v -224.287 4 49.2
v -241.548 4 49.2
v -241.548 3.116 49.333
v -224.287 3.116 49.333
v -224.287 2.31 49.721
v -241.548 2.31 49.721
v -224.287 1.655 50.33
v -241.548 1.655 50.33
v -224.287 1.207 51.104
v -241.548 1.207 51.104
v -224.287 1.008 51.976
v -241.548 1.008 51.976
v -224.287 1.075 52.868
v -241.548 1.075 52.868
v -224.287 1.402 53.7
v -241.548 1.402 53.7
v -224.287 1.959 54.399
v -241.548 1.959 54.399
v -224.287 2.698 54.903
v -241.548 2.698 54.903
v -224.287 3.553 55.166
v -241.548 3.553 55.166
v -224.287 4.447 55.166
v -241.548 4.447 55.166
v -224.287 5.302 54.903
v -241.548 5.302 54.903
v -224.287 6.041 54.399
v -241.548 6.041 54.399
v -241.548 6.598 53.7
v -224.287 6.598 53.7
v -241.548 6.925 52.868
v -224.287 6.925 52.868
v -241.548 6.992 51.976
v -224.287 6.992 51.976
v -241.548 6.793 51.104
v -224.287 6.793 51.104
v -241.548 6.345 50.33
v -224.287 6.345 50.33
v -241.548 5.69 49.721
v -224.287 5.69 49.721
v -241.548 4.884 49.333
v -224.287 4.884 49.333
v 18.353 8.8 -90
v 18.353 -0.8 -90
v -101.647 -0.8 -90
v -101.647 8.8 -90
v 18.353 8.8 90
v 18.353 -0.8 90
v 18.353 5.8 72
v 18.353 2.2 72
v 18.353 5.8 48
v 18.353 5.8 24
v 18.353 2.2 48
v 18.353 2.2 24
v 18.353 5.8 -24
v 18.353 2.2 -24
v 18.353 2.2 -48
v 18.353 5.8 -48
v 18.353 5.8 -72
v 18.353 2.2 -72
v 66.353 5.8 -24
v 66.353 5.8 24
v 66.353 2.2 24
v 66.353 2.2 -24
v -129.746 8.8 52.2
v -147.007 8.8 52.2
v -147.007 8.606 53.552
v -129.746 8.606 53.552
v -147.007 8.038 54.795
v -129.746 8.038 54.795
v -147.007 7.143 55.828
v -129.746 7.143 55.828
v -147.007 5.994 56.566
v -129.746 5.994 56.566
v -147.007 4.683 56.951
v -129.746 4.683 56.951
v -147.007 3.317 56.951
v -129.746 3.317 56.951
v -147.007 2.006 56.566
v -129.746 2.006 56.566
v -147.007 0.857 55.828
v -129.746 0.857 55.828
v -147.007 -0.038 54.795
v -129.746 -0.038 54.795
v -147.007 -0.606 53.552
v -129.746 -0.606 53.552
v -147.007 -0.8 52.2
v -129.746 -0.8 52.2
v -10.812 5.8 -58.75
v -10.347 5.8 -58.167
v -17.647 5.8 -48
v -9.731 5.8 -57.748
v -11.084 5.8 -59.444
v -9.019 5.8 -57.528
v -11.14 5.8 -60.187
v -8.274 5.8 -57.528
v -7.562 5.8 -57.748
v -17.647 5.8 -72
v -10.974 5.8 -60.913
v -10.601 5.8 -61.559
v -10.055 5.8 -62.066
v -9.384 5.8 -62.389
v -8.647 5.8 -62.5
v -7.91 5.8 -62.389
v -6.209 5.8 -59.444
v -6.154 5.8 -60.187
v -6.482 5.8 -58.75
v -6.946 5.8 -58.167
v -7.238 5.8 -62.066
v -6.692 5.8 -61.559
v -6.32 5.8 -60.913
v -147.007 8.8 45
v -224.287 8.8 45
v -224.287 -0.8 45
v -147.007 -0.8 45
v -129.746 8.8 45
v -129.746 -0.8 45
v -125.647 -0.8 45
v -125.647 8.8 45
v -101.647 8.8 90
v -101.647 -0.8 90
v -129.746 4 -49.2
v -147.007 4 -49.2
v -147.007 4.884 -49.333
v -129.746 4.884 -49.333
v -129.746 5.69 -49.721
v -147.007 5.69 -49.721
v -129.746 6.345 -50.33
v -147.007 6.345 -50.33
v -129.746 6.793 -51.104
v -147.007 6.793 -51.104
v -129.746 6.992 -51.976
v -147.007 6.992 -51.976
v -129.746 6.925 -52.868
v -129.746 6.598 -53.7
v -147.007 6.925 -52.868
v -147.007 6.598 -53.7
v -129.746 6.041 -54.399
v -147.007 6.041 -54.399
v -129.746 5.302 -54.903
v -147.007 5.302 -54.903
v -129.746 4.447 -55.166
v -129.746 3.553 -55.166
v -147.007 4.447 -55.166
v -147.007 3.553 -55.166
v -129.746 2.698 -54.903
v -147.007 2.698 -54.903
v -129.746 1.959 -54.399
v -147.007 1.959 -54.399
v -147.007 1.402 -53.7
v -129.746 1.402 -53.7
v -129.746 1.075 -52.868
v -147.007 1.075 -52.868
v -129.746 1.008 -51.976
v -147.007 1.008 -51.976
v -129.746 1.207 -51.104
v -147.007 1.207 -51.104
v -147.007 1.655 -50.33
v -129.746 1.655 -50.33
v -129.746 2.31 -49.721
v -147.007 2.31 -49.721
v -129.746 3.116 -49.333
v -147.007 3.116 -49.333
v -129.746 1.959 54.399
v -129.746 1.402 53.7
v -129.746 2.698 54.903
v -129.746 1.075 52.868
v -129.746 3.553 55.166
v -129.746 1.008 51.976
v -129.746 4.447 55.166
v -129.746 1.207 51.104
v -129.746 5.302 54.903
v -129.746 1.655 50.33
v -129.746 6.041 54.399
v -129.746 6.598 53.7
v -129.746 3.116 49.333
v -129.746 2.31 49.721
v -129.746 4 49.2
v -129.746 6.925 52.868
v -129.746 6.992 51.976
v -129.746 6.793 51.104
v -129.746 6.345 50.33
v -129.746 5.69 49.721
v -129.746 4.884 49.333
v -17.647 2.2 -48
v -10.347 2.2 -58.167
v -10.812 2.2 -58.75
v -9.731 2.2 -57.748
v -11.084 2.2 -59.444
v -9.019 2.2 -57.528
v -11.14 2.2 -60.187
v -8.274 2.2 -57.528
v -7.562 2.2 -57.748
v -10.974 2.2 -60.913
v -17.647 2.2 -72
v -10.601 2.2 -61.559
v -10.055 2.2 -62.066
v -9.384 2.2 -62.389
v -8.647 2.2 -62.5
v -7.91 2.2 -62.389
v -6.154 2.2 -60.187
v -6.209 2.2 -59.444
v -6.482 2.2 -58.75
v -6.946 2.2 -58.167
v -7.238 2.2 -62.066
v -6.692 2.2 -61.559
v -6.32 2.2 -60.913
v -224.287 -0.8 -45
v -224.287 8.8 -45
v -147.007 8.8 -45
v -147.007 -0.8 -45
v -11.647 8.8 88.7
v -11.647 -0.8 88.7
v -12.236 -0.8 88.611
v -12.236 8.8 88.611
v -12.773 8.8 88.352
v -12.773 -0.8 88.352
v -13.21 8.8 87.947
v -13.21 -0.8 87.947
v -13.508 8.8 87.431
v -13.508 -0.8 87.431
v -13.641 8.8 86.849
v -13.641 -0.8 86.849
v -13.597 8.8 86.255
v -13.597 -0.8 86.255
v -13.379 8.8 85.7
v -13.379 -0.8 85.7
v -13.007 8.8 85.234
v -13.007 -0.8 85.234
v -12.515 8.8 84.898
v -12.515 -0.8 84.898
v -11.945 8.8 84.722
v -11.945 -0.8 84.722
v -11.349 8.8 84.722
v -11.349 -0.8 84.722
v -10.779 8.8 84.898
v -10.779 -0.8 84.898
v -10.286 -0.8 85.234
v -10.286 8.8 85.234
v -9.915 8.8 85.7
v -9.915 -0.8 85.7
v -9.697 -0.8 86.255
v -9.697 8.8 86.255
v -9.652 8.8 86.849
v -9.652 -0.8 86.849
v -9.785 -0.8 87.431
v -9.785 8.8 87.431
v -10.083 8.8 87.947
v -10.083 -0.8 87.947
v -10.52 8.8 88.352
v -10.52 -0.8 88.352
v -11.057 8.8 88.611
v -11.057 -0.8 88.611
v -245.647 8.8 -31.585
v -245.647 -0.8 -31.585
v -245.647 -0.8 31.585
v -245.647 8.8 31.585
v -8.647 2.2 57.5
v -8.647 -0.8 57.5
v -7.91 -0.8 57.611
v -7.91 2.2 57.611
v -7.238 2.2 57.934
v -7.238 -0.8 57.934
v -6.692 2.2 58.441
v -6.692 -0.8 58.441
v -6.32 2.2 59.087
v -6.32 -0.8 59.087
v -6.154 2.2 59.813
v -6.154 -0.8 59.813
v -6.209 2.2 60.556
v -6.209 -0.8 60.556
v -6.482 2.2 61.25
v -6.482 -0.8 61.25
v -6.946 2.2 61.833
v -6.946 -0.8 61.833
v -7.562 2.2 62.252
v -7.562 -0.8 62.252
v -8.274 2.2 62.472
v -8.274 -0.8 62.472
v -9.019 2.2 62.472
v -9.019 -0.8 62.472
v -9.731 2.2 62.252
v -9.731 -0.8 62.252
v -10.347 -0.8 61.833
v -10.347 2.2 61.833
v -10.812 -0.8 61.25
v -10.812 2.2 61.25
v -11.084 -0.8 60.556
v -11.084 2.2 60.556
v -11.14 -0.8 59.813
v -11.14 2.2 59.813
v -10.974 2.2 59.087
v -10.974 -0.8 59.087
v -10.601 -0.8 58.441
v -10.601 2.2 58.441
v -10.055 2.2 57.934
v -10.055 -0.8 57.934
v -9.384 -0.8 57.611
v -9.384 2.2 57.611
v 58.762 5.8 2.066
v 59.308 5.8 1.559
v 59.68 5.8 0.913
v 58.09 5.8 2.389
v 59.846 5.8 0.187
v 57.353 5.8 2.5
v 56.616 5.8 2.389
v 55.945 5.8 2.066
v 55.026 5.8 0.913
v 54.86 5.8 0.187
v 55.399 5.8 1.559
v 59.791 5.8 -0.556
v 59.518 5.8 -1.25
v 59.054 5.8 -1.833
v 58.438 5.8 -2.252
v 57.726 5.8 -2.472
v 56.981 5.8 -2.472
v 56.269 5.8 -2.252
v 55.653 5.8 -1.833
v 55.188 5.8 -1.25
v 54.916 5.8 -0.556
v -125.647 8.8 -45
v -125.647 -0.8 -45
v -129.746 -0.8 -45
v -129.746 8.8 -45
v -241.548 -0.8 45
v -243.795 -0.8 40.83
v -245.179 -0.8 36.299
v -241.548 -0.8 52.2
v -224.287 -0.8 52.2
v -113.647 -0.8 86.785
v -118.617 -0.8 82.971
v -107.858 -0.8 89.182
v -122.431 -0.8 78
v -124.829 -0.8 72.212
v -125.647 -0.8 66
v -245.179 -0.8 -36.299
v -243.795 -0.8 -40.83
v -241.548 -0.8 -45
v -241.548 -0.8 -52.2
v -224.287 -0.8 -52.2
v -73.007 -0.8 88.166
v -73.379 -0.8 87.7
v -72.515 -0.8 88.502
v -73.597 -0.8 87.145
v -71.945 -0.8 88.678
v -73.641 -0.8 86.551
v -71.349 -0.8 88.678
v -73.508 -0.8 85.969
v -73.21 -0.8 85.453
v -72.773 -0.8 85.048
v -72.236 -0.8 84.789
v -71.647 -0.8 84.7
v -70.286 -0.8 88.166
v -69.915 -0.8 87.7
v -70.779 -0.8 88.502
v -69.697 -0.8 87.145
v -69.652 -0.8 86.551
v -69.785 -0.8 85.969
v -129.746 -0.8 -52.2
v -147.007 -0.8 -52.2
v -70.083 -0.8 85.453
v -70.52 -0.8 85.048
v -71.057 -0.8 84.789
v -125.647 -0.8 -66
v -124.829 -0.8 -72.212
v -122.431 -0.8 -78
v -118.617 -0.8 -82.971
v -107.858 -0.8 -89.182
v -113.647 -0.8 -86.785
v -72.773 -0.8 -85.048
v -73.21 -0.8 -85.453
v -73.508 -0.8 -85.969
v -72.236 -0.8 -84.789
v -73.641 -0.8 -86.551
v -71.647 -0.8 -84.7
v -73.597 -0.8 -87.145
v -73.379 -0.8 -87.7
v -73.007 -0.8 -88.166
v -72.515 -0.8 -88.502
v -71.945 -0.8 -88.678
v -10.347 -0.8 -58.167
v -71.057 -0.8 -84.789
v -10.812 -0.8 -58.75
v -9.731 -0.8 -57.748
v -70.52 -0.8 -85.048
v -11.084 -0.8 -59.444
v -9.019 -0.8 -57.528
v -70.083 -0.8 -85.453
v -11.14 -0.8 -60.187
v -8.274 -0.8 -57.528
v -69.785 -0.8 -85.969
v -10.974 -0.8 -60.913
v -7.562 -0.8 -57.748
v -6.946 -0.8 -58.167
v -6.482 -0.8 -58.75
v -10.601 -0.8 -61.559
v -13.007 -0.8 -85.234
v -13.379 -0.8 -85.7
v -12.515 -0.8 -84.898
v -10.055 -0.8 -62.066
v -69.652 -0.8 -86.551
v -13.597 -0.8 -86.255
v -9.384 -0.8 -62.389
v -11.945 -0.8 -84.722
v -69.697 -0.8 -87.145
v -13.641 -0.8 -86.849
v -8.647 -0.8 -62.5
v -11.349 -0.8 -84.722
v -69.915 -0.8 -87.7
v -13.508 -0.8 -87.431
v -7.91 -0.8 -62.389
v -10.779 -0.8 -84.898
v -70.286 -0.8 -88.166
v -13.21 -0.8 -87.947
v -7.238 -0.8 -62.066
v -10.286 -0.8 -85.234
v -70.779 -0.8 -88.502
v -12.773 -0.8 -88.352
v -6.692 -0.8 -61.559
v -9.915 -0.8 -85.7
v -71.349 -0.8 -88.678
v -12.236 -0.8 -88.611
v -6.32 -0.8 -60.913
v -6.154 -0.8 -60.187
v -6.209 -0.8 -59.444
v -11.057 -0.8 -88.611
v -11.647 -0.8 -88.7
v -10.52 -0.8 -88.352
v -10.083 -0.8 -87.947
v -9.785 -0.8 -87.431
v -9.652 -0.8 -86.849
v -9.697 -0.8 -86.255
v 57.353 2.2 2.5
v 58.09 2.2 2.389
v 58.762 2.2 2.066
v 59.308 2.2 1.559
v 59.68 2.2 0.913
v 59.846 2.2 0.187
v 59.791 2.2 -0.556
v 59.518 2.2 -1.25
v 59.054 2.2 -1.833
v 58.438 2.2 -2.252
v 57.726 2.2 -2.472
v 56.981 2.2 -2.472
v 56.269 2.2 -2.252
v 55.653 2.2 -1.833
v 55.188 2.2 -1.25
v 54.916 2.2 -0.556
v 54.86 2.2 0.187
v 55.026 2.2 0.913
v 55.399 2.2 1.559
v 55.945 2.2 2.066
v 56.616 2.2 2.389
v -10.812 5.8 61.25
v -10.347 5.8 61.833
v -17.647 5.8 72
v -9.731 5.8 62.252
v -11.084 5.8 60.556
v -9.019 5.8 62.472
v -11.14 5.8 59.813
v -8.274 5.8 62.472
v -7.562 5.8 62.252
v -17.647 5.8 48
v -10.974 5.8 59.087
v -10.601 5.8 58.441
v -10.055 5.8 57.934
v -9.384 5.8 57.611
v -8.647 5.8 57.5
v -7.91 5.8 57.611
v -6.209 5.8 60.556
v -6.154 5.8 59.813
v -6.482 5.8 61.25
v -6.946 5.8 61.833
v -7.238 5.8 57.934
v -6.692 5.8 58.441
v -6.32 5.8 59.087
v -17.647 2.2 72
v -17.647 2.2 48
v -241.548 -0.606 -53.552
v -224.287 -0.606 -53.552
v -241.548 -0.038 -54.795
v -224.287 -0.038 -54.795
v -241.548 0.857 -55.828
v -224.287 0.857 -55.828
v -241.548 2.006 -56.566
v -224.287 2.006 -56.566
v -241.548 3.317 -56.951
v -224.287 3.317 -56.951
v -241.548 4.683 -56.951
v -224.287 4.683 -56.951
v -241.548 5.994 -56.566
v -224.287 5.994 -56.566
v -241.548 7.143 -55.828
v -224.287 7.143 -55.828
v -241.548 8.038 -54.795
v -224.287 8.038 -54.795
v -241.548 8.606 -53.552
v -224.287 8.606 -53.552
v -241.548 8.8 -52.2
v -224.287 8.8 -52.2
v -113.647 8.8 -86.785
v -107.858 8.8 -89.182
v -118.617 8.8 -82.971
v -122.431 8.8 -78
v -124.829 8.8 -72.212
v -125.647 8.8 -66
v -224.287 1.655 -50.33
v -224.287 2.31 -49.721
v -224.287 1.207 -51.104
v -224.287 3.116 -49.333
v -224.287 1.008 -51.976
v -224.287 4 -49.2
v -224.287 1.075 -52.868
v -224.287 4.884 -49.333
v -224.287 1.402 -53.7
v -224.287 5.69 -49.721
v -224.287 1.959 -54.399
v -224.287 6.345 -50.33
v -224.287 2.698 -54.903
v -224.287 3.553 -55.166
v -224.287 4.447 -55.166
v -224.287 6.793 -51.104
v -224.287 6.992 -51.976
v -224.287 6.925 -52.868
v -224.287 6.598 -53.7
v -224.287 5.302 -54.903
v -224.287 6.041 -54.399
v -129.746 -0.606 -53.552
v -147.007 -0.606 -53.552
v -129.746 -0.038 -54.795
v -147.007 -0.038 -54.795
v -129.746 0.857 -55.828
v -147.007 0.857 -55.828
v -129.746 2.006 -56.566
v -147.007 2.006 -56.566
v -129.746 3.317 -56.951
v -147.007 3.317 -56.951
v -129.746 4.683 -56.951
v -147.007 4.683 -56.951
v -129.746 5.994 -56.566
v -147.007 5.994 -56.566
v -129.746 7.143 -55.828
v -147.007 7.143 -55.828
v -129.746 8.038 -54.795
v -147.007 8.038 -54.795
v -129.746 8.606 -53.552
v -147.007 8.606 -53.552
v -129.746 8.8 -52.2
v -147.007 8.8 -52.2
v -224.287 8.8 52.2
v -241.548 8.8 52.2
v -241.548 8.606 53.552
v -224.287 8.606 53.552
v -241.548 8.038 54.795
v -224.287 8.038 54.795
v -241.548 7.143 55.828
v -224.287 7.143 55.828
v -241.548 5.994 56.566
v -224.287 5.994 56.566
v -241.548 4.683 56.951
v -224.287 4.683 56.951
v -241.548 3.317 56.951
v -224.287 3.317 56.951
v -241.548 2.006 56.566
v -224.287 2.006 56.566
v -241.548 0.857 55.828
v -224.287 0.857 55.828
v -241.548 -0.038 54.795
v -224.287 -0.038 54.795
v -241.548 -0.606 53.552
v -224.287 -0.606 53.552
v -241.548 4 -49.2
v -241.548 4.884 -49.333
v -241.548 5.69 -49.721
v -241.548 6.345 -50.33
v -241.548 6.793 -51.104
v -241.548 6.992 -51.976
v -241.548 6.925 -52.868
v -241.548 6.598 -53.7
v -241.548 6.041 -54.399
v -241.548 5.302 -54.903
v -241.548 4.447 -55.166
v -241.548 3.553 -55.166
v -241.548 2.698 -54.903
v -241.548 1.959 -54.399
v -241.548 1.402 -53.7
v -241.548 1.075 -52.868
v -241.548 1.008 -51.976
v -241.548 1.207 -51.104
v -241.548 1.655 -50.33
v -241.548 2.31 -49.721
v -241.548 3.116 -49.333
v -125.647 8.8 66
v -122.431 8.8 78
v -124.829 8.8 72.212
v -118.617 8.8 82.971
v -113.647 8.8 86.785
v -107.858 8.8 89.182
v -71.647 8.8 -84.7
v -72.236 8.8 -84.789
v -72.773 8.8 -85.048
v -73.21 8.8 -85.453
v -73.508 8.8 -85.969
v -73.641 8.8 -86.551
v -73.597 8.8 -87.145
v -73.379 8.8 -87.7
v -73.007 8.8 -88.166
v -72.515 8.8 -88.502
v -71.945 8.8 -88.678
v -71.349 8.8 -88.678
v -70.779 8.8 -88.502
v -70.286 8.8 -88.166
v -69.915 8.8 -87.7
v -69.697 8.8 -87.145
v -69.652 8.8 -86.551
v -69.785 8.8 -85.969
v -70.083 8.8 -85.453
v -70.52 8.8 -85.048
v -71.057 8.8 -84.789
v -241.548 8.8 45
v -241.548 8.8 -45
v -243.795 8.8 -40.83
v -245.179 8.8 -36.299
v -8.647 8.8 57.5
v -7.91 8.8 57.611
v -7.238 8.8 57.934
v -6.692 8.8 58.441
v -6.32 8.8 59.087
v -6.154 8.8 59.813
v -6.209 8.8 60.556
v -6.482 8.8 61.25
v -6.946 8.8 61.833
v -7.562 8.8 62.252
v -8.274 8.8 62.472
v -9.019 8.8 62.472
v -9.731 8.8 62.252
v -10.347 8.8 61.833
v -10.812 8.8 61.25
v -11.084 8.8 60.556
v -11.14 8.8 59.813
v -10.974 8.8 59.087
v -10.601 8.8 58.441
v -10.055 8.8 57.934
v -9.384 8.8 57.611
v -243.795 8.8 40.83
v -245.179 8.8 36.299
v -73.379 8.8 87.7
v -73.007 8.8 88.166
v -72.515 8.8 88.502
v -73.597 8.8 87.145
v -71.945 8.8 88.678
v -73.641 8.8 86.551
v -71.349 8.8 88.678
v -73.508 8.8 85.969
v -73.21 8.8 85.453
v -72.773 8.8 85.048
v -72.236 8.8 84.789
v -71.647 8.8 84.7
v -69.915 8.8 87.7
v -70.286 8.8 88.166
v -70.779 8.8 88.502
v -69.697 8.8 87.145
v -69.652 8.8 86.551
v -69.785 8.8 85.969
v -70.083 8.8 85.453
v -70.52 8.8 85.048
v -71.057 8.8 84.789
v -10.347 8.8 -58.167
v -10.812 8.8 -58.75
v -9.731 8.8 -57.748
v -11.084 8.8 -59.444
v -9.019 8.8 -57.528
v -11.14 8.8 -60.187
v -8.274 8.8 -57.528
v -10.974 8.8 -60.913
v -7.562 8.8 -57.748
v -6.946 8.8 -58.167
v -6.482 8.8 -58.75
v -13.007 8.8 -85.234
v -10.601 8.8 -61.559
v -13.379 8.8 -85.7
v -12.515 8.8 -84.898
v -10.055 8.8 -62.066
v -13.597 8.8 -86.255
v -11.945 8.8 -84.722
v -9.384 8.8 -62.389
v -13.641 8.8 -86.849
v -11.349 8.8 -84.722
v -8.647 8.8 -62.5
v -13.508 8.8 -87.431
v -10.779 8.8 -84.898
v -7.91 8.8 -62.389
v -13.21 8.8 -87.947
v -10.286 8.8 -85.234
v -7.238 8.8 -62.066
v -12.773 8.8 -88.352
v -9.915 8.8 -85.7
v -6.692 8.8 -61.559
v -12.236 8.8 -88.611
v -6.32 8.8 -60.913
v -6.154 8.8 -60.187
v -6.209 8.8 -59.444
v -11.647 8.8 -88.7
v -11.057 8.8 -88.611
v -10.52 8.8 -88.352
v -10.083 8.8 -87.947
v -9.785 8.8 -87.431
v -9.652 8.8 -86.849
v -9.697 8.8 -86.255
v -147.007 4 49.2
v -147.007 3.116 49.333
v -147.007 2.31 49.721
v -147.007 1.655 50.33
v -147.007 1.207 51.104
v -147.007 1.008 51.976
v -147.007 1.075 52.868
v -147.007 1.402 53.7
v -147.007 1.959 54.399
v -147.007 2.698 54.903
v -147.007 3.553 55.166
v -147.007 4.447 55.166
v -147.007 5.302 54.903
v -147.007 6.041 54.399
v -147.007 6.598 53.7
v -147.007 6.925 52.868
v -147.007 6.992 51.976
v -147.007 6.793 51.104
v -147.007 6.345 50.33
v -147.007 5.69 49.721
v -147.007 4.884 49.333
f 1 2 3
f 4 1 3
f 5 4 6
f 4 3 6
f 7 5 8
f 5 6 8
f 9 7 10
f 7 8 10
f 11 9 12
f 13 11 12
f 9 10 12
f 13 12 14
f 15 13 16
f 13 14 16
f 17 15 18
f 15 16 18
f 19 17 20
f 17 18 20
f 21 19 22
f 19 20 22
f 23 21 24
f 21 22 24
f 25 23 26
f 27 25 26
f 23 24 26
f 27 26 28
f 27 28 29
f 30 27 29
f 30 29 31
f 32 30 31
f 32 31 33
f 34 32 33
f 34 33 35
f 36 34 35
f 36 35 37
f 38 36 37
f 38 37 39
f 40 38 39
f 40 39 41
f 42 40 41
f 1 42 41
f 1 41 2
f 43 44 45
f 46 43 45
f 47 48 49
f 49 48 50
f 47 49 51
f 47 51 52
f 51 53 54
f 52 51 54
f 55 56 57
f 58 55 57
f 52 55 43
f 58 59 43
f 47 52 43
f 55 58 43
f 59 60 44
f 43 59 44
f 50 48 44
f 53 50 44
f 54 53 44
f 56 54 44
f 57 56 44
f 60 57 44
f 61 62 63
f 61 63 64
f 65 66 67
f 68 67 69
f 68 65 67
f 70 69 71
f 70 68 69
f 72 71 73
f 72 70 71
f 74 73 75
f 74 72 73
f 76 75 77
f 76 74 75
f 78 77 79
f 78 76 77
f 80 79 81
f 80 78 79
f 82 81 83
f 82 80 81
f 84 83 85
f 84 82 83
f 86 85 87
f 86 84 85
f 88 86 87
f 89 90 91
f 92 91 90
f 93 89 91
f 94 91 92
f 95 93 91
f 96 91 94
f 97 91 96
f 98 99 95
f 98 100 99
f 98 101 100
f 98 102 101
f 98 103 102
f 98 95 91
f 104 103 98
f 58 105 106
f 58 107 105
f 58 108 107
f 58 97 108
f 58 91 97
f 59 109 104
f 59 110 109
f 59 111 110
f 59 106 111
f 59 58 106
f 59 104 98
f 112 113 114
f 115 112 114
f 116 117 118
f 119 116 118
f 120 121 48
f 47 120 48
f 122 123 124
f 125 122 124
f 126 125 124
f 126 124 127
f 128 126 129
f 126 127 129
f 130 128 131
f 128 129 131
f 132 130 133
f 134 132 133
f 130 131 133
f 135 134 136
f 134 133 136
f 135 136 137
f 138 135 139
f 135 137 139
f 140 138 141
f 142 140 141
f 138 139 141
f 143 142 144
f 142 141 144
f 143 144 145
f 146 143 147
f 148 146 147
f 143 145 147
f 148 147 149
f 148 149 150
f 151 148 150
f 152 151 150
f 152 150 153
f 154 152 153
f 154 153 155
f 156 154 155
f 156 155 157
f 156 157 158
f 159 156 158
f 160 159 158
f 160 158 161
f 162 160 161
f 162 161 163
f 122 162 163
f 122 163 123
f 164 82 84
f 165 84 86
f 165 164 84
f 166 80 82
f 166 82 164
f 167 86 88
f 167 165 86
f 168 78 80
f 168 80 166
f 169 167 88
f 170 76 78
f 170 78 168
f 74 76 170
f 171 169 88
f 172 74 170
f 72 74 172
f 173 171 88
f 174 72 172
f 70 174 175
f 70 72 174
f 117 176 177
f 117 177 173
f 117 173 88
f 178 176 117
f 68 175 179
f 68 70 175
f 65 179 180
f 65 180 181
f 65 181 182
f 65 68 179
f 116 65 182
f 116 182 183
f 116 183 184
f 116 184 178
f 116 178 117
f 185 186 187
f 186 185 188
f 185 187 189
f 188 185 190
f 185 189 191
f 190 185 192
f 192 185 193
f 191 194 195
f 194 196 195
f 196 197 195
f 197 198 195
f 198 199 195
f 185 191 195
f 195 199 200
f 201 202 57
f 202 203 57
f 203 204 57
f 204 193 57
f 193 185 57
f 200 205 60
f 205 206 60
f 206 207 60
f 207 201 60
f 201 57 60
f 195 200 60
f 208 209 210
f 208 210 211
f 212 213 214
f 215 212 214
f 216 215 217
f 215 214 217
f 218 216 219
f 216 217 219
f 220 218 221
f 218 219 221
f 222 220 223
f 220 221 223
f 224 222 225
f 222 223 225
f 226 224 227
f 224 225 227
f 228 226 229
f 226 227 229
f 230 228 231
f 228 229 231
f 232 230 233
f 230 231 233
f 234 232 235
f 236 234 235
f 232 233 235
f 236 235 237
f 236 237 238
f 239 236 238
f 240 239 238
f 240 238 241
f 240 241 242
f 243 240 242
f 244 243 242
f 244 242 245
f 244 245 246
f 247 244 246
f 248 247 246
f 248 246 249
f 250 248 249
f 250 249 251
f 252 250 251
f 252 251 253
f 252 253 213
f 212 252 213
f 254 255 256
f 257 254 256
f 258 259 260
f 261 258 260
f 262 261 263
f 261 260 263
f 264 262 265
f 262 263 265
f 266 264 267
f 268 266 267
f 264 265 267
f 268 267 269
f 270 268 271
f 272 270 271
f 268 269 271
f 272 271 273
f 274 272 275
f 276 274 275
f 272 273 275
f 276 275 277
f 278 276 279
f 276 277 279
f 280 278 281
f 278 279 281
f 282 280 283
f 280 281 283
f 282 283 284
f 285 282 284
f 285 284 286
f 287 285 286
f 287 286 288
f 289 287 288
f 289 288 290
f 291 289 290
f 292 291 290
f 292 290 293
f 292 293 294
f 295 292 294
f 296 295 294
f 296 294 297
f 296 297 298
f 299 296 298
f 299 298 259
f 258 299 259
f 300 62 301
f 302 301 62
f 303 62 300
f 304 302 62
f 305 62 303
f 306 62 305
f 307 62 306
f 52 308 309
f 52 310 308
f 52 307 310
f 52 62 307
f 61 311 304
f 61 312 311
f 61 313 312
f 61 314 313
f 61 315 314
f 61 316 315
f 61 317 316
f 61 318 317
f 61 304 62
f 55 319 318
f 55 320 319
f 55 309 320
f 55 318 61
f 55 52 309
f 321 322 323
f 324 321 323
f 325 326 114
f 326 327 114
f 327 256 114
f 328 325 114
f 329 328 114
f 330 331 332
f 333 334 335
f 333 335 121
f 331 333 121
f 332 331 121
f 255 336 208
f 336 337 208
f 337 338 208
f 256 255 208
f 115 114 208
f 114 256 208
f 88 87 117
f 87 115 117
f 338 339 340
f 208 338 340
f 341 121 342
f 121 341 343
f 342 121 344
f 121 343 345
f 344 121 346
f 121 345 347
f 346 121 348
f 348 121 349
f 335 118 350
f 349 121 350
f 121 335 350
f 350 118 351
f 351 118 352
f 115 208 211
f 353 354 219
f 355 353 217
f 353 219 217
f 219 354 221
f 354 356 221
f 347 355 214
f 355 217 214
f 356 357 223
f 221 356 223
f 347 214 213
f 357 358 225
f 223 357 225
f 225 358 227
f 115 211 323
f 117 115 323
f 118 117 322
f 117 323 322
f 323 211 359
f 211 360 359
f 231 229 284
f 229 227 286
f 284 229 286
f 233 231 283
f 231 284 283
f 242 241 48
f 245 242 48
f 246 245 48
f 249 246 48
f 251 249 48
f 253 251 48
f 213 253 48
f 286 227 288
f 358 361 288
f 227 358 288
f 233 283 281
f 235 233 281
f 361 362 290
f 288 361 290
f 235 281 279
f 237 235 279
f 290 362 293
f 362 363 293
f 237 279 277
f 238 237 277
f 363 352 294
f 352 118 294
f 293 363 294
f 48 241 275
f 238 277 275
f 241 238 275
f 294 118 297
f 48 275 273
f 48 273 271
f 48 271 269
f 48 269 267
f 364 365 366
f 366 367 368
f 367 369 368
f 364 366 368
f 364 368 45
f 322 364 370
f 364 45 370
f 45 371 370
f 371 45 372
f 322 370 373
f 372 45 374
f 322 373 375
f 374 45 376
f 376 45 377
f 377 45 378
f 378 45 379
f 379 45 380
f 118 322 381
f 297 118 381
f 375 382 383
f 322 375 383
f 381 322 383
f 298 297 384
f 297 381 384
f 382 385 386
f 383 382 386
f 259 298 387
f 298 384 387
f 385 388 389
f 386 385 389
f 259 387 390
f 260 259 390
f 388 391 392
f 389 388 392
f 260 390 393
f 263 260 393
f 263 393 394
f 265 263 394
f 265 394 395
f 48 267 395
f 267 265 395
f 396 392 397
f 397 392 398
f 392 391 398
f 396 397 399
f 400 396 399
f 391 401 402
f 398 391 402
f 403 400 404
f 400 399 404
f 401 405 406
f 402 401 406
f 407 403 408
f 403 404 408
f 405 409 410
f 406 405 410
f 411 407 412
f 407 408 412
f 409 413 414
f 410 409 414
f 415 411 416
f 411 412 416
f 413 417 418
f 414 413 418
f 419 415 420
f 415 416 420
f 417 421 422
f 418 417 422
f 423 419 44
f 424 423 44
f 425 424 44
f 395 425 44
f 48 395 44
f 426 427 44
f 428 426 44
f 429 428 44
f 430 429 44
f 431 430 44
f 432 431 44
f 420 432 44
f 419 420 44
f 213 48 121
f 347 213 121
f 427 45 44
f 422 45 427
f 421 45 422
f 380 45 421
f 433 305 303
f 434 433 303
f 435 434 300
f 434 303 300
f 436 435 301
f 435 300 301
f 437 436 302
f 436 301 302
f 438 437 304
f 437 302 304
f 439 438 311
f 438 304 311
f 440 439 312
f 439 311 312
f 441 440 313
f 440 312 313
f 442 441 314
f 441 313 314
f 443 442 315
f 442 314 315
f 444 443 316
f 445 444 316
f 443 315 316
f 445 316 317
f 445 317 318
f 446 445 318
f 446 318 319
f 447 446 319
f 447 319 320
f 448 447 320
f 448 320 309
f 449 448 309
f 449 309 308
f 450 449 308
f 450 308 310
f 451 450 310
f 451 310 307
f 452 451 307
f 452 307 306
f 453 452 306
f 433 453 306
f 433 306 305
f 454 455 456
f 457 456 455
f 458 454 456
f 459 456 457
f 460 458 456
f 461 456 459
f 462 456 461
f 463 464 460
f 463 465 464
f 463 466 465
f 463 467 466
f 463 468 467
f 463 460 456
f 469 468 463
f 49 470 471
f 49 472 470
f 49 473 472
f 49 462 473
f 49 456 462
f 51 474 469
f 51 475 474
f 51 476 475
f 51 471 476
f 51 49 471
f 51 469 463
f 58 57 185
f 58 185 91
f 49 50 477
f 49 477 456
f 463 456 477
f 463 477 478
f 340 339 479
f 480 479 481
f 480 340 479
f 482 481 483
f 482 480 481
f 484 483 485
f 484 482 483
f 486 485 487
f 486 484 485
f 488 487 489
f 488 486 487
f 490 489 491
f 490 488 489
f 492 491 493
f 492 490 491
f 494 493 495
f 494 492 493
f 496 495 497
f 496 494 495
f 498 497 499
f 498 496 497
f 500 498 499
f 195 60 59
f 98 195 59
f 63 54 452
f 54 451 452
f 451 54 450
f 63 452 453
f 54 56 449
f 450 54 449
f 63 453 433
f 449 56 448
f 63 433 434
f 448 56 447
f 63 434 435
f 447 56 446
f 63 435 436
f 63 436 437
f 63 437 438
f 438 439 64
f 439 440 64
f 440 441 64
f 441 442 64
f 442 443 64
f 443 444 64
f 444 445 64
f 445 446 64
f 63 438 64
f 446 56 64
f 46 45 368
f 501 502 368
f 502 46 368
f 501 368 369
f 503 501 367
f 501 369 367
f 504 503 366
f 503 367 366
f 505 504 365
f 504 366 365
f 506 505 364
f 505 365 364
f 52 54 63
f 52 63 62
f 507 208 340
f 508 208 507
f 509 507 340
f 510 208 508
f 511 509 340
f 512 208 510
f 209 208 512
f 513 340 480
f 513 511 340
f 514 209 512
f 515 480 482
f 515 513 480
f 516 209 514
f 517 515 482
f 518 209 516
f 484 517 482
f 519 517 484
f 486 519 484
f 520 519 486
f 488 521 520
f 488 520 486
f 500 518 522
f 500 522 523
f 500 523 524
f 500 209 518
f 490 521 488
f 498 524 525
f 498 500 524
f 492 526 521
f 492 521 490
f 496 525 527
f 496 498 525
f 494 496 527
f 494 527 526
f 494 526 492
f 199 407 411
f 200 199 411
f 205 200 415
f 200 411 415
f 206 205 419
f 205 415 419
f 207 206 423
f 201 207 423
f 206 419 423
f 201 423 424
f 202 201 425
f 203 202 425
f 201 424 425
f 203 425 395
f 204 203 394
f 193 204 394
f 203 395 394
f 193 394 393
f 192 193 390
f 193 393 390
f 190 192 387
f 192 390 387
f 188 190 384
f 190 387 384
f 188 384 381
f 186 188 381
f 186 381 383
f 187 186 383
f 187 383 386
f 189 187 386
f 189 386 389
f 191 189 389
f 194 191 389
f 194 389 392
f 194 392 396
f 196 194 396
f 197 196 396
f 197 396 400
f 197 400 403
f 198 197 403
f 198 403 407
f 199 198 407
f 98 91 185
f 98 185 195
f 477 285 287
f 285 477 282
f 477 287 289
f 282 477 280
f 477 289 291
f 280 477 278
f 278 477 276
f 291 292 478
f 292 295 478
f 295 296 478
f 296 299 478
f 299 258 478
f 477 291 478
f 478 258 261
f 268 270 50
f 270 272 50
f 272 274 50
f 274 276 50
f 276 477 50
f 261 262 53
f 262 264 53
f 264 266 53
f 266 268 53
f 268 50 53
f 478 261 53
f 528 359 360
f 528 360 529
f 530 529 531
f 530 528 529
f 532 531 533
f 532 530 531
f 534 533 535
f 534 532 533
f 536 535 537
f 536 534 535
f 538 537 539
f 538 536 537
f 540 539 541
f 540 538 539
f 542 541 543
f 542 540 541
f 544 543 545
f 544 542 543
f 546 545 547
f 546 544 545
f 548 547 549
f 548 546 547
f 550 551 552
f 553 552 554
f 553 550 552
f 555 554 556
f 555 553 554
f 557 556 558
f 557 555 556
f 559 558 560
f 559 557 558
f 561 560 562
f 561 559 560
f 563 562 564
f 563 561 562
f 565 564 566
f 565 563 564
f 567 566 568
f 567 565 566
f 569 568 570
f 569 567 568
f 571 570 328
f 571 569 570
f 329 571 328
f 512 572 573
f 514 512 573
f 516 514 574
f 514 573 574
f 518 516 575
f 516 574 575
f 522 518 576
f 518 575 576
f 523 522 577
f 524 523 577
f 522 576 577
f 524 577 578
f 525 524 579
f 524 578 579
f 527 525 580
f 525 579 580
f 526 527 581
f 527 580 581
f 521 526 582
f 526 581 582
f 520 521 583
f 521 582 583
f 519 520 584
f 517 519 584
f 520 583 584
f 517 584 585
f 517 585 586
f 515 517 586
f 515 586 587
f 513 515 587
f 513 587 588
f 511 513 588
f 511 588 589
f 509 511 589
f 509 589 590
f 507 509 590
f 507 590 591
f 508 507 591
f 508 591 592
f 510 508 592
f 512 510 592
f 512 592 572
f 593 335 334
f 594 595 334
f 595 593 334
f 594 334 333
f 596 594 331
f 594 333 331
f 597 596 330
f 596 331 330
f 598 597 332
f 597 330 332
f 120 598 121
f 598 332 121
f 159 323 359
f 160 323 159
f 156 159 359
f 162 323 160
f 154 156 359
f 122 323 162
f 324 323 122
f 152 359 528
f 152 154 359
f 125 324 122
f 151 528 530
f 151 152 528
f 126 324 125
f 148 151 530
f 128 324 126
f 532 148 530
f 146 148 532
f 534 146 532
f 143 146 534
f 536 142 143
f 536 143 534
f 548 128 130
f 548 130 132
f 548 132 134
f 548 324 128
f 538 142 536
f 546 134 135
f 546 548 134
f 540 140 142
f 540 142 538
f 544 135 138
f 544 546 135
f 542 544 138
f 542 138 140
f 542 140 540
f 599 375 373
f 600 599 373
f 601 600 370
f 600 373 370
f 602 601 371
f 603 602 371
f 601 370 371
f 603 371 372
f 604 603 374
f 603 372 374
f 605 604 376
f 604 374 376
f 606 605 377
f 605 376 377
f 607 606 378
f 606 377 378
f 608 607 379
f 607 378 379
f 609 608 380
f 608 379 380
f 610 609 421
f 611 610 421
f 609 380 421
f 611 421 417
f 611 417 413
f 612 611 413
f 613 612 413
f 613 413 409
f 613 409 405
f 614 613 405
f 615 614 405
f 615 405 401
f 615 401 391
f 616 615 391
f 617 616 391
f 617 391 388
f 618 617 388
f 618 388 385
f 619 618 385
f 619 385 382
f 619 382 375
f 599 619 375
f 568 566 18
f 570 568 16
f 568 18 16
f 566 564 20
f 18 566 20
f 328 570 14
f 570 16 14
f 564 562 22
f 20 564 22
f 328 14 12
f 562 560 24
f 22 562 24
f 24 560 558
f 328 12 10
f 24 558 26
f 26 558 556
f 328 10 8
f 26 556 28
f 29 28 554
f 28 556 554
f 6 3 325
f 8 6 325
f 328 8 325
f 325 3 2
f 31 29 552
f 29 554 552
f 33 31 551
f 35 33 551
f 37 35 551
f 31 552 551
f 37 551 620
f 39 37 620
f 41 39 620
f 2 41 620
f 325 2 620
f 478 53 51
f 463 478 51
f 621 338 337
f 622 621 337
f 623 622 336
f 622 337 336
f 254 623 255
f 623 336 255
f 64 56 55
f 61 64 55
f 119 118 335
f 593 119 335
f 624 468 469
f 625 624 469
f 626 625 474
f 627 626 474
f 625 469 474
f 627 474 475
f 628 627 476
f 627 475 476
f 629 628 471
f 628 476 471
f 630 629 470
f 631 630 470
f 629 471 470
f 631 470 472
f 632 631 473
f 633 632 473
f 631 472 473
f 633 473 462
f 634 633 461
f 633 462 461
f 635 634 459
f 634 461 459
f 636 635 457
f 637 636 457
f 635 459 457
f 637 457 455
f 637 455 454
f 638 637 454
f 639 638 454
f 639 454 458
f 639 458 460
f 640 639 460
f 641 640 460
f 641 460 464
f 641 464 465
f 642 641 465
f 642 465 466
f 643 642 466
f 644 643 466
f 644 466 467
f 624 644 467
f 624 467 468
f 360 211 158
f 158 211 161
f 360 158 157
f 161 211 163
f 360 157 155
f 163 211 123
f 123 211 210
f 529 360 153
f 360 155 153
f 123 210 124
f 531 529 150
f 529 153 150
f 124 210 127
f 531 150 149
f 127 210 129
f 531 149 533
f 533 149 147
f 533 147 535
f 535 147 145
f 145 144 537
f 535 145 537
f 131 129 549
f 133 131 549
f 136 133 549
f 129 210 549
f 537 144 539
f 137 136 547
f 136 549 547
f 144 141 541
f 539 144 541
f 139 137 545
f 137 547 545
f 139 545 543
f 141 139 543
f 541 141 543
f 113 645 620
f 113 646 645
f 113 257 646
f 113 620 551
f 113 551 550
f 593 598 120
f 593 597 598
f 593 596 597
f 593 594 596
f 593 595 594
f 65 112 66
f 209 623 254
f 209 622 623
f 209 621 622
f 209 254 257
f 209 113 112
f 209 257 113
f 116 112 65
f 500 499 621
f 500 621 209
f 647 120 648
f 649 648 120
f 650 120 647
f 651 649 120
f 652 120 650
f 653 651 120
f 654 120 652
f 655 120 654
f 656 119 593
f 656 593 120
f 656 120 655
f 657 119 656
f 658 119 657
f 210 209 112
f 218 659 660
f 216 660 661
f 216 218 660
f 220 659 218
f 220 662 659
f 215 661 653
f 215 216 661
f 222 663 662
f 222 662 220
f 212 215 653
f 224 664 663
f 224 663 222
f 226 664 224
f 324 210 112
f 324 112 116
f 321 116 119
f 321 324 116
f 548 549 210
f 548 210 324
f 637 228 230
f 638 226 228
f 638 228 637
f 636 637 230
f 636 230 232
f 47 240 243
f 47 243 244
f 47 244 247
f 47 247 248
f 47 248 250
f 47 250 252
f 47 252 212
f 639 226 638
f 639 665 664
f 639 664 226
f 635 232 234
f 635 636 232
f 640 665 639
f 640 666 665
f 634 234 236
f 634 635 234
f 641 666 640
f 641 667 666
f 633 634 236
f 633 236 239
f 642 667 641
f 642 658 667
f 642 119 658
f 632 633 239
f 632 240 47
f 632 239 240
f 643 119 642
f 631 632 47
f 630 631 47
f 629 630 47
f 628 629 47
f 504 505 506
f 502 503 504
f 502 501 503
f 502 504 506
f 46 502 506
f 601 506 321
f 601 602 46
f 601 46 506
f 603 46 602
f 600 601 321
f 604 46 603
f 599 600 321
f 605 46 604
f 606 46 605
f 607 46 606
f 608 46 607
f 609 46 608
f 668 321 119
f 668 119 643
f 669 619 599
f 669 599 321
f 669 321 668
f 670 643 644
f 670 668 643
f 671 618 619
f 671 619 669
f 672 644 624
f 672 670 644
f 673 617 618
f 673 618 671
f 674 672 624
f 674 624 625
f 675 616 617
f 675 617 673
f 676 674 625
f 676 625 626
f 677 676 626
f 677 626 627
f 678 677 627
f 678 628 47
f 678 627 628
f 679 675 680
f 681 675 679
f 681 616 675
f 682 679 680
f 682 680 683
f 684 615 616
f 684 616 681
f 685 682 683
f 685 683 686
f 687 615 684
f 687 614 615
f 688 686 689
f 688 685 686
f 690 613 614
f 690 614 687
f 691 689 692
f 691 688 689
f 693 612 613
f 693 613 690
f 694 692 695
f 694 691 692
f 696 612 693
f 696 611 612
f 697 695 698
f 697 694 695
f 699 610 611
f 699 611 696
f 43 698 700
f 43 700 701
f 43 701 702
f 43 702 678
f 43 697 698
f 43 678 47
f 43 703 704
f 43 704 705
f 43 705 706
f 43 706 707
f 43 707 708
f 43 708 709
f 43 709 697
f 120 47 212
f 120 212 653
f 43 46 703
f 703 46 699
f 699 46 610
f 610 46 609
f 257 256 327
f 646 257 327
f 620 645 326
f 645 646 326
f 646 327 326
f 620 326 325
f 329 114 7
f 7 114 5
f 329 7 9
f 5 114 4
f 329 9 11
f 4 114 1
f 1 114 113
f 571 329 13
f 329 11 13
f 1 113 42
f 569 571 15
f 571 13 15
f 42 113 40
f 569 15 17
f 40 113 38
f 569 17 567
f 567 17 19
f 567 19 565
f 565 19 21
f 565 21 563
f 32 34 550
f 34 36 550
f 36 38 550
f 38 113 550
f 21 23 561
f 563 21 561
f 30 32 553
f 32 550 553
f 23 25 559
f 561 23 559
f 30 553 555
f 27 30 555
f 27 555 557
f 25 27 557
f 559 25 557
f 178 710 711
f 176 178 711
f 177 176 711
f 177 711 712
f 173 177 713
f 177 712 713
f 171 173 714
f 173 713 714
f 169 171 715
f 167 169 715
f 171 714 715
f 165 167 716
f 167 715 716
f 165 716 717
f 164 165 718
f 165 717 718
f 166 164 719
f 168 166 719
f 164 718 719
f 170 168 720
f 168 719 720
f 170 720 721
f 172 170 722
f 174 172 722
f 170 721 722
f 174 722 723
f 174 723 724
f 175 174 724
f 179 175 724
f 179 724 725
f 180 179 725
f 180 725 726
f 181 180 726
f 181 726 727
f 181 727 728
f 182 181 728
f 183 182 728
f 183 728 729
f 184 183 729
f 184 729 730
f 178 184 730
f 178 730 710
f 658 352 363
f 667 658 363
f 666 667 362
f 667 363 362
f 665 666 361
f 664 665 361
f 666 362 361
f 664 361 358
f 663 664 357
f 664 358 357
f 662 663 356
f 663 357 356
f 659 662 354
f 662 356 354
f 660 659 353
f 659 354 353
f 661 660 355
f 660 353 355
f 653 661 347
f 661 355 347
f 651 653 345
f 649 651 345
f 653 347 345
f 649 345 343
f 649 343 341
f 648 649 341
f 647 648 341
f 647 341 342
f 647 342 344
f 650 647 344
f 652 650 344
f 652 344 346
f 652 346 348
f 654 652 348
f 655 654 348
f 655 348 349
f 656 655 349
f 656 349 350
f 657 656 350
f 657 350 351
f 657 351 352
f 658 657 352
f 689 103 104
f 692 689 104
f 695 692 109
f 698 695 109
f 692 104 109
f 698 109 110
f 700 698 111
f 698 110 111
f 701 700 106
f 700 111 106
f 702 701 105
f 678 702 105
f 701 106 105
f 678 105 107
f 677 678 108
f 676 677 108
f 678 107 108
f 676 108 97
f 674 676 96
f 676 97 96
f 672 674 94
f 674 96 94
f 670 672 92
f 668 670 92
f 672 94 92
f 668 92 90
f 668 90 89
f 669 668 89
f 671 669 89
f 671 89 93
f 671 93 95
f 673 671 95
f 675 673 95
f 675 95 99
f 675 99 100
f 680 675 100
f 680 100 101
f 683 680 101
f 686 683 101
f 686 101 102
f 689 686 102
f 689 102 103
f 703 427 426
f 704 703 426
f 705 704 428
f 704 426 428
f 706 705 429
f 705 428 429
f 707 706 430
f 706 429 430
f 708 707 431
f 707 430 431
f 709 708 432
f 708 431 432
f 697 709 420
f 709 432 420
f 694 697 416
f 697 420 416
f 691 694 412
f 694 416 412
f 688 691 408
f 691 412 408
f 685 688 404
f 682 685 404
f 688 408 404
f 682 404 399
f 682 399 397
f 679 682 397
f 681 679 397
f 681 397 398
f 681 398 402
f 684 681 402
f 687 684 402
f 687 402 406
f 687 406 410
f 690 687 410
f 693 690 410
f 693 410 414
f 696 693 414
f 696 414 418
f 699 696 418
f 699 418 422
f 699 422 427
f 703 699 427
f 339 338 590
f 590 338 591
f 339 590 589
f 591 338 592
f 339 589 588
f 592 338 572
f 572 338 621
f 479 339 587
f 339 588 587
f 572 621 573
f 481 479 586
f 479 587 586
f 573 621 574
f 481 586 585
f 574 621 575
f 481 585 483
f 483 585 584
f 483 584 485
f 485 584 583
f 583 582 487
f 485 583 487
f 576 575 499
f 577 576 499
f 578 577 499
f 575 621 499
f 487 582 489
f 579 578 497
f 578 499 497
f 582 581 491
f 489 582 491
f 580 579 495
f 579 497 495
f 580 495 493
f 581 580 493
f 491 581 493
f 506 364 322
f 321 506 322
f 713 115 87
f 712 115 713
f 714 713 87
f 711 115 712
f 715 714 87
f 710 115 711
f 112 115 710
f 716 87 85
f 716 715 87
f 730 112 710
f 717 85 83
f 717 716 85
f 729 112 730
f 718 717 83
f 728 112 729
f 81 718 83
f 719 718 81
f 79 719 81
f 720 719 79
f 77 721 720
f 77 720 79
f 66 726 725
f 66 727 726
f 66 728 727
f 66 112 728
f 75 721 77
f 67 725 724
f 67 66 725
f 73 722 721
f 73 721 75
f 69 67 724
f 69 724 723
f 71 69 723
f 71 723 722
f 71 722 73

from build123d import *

# Parameters (mm, degrees)
BOSS_EXTRUDE1_DEPTH      = 8
BOSS_EXTRUDE2_DEPTH      = 46.583974855
BOSS_EXTRUDE2_DEPTH_BACK = 46.58397486
SKETCH4_R                = 3.3
CUT_EXTRUDE1_DEPTH       = 32.2
CUT_EXTRUDE1_DEPTH_BACK  = 32.2
SKETCH5_R                = 3.3
SKETCH6_W                = 40
SKETCH6_H                = 3
BOSS_EXTRUDE3_DEPTH      = 40
SKETCH7_R                = 2
CUT_EXTRUDE2_DEPTH       = 233.497849452
SKETCH8_W                = 20
SKETCH8_H                = 3
CUT_EXTRUDE3_DEPTH       = 30
SKETCH9_R                = 2
CUT_EXTRUDE4_DEPTH       = 233.570419443
FILLET1_R                = 20
SKETCH10_R               = 1.5
CUT_EXTRUDE5_DEPTH       = 10
SCALE1_SCALE             = 1.5
SCALE2_SCALE             = 0.8
SKETCH12_R               = 1.8
BOSS_EXTRUDE4_DEPTH      = 9.6
SKETCH13_R               = 2
SKETCH13_R_2             = 2.5
CUT_EXTRUDE6_DEPTH       = 262.790915701
BOSS_EXTRUDE5_REACH      = 322.905
SKETCH14_R               = 4.250728377
SKETCH14_R_2             = 3
SKETCH15_W               = 77.28
SKETCH15_H               = 12
CUT_EXTRUDE7_DEPTH       = 262.790915701
BOSS_EXTRUDE6_START      = -3.6
SKETCH16_R               = 2.5
BOSS_EXTRUDE6_DEPTH      = 3.6
SKETCH17_R               = 2.5
CUT_EXTRUDE8_DEPTH       = 262.698077073


with BuildPart() as part:
    # Sketch1 → Boss-Extrude1 (new body)
    with BuildSketch(Plane(origin=(0, 0, 0), x_dir=(1, 0, 0), z_dir=(0, 1, 0))):
        Polygon((-120, -37.5), (-120, -75), (0, -75), (0, 75), (-120, 75), (-120, 37.5), (-220, 37.5), (-220, -37.5), align=None)
    extrude(amount=BOSS_EXTRUDE1_DEPTH)

    # Sketch4 → Boss-Extrude2 (add, two sides: drawn at the far end of the back side and taken through both)
    # profile 1 of 2: a face of its own
    with BuildSketch(Plane.ZY.offset(170).offset(-BOSS_EXTRUDE2_DEPTH_BACK)):
        with BuildLine():
            Line((37.5, 8), (43.5, 8))
            ThreePointArc((43.5, 8), (47.5, 4), (43.5, 0))
            Line((43.5, 0), (37.5, 0))
            Line((37.5, 0), (37.5, 8))
        make_face()
        with Locations((43.5, 4)):
            Circle(SKETCH4_R, mode=Mode.SUBTRACT)
    # profile 2 of 2: a face of its own
    with BuildSketch(Plane.ZY.offset(170).offset(-BOSS_EXTRUDE2_DEPTH_BACK)):
        with BuildLine():
            Line((-37.5, 0), (-43.5, 0))
            ThreePointArc((-43.5, 0), (-47.5, 4), (-43.5, 8))
            Line((-43.5, 8), (-37.5, 8))
            Line((-37.5, 8), (-37.5, 0))
        make_face()
        with Locations((-43.5, 4)):
            Circle(SKETCH4_R, mode=Mode.SUBTRACT)
    extrude(amount=BOSS_EXTRUDE2_DEPTH + BOSS_EXTRUDE2_DEPTH_BACK)

    # Sketch5 → Cut-Extrude1 (cut, two sides: drawn at the far end of the back side and taken through both)
    # profile 1 of 2: a face of its own
    with BuildSketch(Plane.ZY.offset(170).offset(-CUT_EXTRUDE1_DEPTH_BACK)):
        with BuildLine():
            Line((-43.5, 8), (-37.5, 8))
            Line((-37.5, 8), (-37.5, 0))
            Line((-37.5, 0), (-43.5, 0))
            ThreePointArc((-43.5, 0), (-47.5, 4), (-43.5, 8))
        make_face()
        with Locations((-43.5, 4)):
            Circle(SKETCH5_R, mode=Mode.SUBTRACT)
    # profile 2 of 2: a face of its own
    with BuildSketch(Plane.ZY.offset(170).offset(-CUT_EXTRUDE1_DEPTH_BACK)):
        with BuildLine():
            Line((37.5, 0), (43.5, 0))
            ThreePointArc((43.5, 0), (47.5, 4), (43.5, 8))
            Line((43.5, 8), (37.5, 8))
            Line((37.5, 8), (37.5, 0))
        make_face()
        with Locations((43.5, 4)):
            Circle(SKETCH5_R, mode=Mode.SUBTRACT)
    extrude(amount=CUT_EXTRUDE1_DEPTH + CUT_EXTRUDE1_DEPTH_BACK, mode=Mode.SUBTRACT)

    # Sketch6 → Boss-Extrude3 (add)
    with BuildSketch(Plane(origin=(0, 0, 0), x_dir=(0, 0, -1), z_dir=(1, 0, 0))):
        with Locations((0, 4)):
            Rectangle(SKETCH6_W, SKETCH6_H)
    extrude(amount=BOSS_EXTRUDE3_DEPTH)

    # Sketch7 → Cut-Extrude2 (cut, through all)
    with BuildSketch(Plane(origin=(0, 5.5, 0), x_dir=(1, 0, 0), z_dir=(0, 1, 0))):
        with Locations(Location((32.75, 0, 0), (0, 0, 270))):
            Circle(SKETCH7_R)
    extrude(amount=-CUT_EXTRUDE2_DEPTH, mode=Mode.SUBTRACT)

    # Sketch8 → Cut-Extrude3 (cut)
    with BuildSketch(Plane(origin=(0, 0, 0), x_dir=(0, 0, -1), z_dir=(1, 0, 0))):
        with Locations((-50, 4)):
            Rectangle(SKETCH8_W, SKETCH8_H)
        with Locations((50, 4)):
            Rectangle(SKETCH8_W, SKETCH8_H)
    extrude(amount=-CUT_EXTRUDE3_DEPTH, mode=Mode.SUBTRACT)

    # Sketch9 → Cut-Extrude4 (cut, through all)
    with BuildSketch(Plane(origin=(0, 8, 0), x_dir=(1, 0, 0), z_dir=(0, 1, 0))):
        with Locations(Location((-22.5, -50, 0), (0, 0, 270))):
            Circle(SKETCH9_R)
        with Locations(Location((-22.5, 50, 0), (0, 0, 90))):
            Circle(SKETCH9_R)
    extrude(amount=-CUT_EXTRUDE4_DEPTH, mode=Mode.SUBTRACT)

    # Fillet1
    # the kernel refuses this fillet: 20 mm, written as the material it takes off along each edge
    with BuildSketch(Plane(origin=(-220, -27.947694226, 37.5), x_dir=(1, 0, 0), z_dir=(0, 1, 0))) as fillet1_piece_1:
        with BuildLine():
            CenterArc((20, 11.17907769), FILLET1_R, 180, 33.98348272)
            Line((0, 11.17907769), (-0.4, 11.17907769))
            Line((-0.4, 11.17907769), (-0.4, 0))
            Line((-0.4, 0), (0, -0.4))
            ThreePointArc((0, -0.4), (1.708012572, -0.4), (3.084345648, -0.223581554))
            Line((3.084345648, -0.223581554), (3.416025145, 0))
        make_face()
    extrude(amount=63.895388452, mode=Mode.SUBTRACT)
    with BuildSketch(Plane(origin=(-220, -27.947694226, -37.5), x_dir=(0, 0, 1), z_dir=(0, 1, 0))) as fillet1_piece_2:
        with BuildLine():
            CenterArc((11.17907769, 20), FILLET1_R, 236.01651728, 33.98348272)
            Line((0, 3.416025145), (-0.223581554, 3.084345648))
            ThreePointArc((-0.223581554, 3.084345648), (-0.4, 1.708012572), (-0.4, 0))
            Line((-0.4, 0), (0, -0.4))
            Line((0, -0.4), (11.17907769, -0.4))
            Line((11.17907769, -0.4), (11.17907769, 0))
        make_face()
    extrude(amount=63.895388452, mode=Mode.SUBTRACT)
    with BuildSketch(Plane(origin=(-120, -50, -75), x_dir=(1, 0, 0), z_dir=(0, 1, 0)), Plane(origin=(-120, -50, 75), x_dir=(0, 0, -1), z_dir=(0, 1, 0))) as fillet1_piece_3:
        with BuildLine():
            CenterArc((FILLET1_R, -FILLET1_R), FILLET1_R, 90, 90)
            Line((0, -FILLET1_R), (-FILLET1_R * 0.02, -FILLET1_R))
            Line((-FILLET1_R * 0.02, -FILLET1_R), (-FILLET1_R * 0.02, FILLET1_R * 0.02))
            Line((-FILLET1_R * 0.02, FILLET1_R * 0.02), (FILLET1_R, FILLET1_R * 0.02))
            Line((FILLET1_R, FILLET1_R * 0.02), (FILLET1_R, 0))
        make_face()
    extrude(amount=108, mode=Mode.SUBTRACT)

    # Sketch10 → Cut-Extrude5 (cut)
    with BuildSketch(Plane(origin=(0, 8, 0), x_dir=(1, 0, 0), z_dir=(0, 1, 0))):
        with Locations(Location((-25, 72.5, 0), (0, 0, 270))):
            Circle(SKETCH10_R)
        with Locations(Location((-75, 72.5, 0), (0, 0, 270))):
            Circle(SKETCH10_R)
        with Locations(Location((-25, -72.5, 0), (0, 0, 270))):
            Circle(SKETCH10_R)
        with Locations(Location((-75, -72.5, 0), (0, 0, 270))):
            Circle(SKETCH10_R)
    extrude(amount=-CUT_EXTRUDE5_DEPTH, mode=Mode.SUBTRACT)


with BuildPart() as part_1:
    # Scale1: scaled about (-91.766272815, 4, 0)
    add(part.part.scale(SCALE1_SCALE).moved(Location((45.883136407, -2, 0))))


with BuildPart() as part_2:
    # Scale2: scaled about (-91.766272815, 4, 0)
    add(part_1.part.scale(SCALE2_SCALE).moved(Location((-18.353254563, 0.8, 0))))

    # Sketch12 → Boss-Extrude4 (add, through all)
    with BuildSketch(Plane(origin=(0, 8.8, 0), x_dir=(1, 0, 0), z_dir=(0, 1, 0))):
        with Locations((-71.646745437, 87)):
            Circle(SKETCH12_R)
        with Locations((-11.646745437, 87)):
            Circle(SKETCH12_R)
        with Locations((-11.646745437, -87)):
            Circle(SKETCH12_R)
        with Locations((-71.646745437, -87)):
            Circle(SKETCH12_R)
    extrude(amount=-BOSS_EXTRUDE4_DEPTH)

    # Sketch13 → Cut-Extrude6 (cut, through all)
    with BuildSketch(Plane.XZ.offset(0.8)):
        with Locations(Location((-71.646745437, 86.7, 0), (0, 0, 270))):
            Circle(SKETCH13_R)
        with Locations(Location((-11.646745437, 86.7, 0), (0, 0, 90))):
            Circle(SKETCH13_R)
        with Locations(Location((-11.646745437, -86.7, 0), (0, 0, 270))):
            Circle(SKETCH13_R)
        with Locations(Location((-71.646745437, -86.7, 0), (0, 0, 90))):
            Circle(SKETCH13_R)
        with Locations(Location((-8.646745437, 60, 0), (0, 0, 270))):
            Circle(SKETCH13_R_2)
        with Locations(Location((57.653254563, 0, 0), (0, 0, 270))):
            Circle(SKETCH13_R_2)
        with Locations(Location((-8.646745437, -60, 0), (0, 0, 270))):
            Circle(SKETCH13_R_2)
    extrude(amount=-CUT_EXTRUDE6_DEPTH, mode=Mode.SUBTRACT)

    # Boss-Extrude5: up to this face of the body (flat: up to its plane)
    boss_extrude5_end = Plane(part_2.part.faces().sort_by_distance((-129.745975605, 8.646325018, -48.6))[0])
    # Sketch14 → Boss-Extrude5 (add, up to the picked face)
    with BuildSketch(Plane.ZY.offset(241.547515263), mode=Mode.PRIVATE) as boss_extrude5_sk1:
        with Locations((-52.2, 4)):
            Circle(SKETCH14_R)
        with Locations((-52.2, 4)):
            Circle(SKETCH14_R_2, mode=Mode.SUBTRACT)
    boss_extrude5_tool1 = split(extrude(boss_extrude5_sk1.sketch, amount=-BOSS_EXTRUDE5_REACH, mode=Mode.PRIVATE), bisect_by=boss_extrude5_end, keep=Keep.BOTH, mode=Mode.PRIVATE)
    # Sketch14 → Boss-Extrude5 (add, up to the picked face)
    with BuildSketch(Plane.ZY.offset(241.547515263), mode=Mode.PRIVATE) as boss_extrude5_sk2:
        with Locations(Location((52.2, 4, 0), (0, 0, 180))):
            Circle(SKETCH14_R)
        with Locations(Location((52.2, 4, 0), (0, 0, 180))):
            Circle(SKETCH14_R_2, mode=Mode.SUBTRACT)
    boss_extrude5_tool2 = split(extrude(boss_extrude5_sk2.sketch, amount=-BOSS_EXTRUDE5_REACH, mode=Mode.PRIVATE), bisect_by=boss_extrude5_end, keep=Keep.BOTH, mode=Mode.PRIVATE)
    add(boss_extrude5_tool1.solids().sort_by(Axis((-241.547515, 4, -56.3305), (1, 0, 0)))[0])
    add(boss_extrude5_tool2.solids().sort_by(Axis((-241.547515, 4, 56.3305), (1, 0, 0)))[0])

    # Sketch15 → Cut-Extrude7 (cut, through all)
    with BuildSketch(Plane(origin=(0, 8.8, 0), x_dir=(1, 0, 0), z_dir=(0, 1, 0))):
        with Locations((-185.646745437, 51)):
            Rectangle(SKETCH15_W, SKETCH15_H)
        with Locations((-185.646745437, -51)):
            Rectangle(SKETCH15_W, SKETCH15_H)
    extrude(amount=-CUT_EXTRUDE7_DEPTH, mode=Mode.SUBTRACT)

    # Sketch16 → Boss-Extrude6 (add)
    with BuildSketch(Plane(origin=(0, 5.8, 0), x_dir=(1, 0, 0), z_dir=(0, 1, 0)).offset(BOSS_EXTRUDE6_START)):
        with Locations((57.653254563, 0)):
            Circle(SKETCH16_R)
    extrude(amount=BOSS_EXTRUDE6_DEPTH)

    # Sketch17 → Cut-Extrude8 (cut, through all)
    with BuildSketch(Plane(origin=(0, 5.8, 0), x_dir=(1, 0, 0), z_dir=(0, 1, 0))):
        with Locations(Location((57.353254563, 0, 0), (0, 0, 270))):
            Circle(SKETCH17_R)
    extrude(amount=-CUT_EXTRUDE8_DEPTH, mode=Mode.SUBTRACT)


solid = part_2.part
